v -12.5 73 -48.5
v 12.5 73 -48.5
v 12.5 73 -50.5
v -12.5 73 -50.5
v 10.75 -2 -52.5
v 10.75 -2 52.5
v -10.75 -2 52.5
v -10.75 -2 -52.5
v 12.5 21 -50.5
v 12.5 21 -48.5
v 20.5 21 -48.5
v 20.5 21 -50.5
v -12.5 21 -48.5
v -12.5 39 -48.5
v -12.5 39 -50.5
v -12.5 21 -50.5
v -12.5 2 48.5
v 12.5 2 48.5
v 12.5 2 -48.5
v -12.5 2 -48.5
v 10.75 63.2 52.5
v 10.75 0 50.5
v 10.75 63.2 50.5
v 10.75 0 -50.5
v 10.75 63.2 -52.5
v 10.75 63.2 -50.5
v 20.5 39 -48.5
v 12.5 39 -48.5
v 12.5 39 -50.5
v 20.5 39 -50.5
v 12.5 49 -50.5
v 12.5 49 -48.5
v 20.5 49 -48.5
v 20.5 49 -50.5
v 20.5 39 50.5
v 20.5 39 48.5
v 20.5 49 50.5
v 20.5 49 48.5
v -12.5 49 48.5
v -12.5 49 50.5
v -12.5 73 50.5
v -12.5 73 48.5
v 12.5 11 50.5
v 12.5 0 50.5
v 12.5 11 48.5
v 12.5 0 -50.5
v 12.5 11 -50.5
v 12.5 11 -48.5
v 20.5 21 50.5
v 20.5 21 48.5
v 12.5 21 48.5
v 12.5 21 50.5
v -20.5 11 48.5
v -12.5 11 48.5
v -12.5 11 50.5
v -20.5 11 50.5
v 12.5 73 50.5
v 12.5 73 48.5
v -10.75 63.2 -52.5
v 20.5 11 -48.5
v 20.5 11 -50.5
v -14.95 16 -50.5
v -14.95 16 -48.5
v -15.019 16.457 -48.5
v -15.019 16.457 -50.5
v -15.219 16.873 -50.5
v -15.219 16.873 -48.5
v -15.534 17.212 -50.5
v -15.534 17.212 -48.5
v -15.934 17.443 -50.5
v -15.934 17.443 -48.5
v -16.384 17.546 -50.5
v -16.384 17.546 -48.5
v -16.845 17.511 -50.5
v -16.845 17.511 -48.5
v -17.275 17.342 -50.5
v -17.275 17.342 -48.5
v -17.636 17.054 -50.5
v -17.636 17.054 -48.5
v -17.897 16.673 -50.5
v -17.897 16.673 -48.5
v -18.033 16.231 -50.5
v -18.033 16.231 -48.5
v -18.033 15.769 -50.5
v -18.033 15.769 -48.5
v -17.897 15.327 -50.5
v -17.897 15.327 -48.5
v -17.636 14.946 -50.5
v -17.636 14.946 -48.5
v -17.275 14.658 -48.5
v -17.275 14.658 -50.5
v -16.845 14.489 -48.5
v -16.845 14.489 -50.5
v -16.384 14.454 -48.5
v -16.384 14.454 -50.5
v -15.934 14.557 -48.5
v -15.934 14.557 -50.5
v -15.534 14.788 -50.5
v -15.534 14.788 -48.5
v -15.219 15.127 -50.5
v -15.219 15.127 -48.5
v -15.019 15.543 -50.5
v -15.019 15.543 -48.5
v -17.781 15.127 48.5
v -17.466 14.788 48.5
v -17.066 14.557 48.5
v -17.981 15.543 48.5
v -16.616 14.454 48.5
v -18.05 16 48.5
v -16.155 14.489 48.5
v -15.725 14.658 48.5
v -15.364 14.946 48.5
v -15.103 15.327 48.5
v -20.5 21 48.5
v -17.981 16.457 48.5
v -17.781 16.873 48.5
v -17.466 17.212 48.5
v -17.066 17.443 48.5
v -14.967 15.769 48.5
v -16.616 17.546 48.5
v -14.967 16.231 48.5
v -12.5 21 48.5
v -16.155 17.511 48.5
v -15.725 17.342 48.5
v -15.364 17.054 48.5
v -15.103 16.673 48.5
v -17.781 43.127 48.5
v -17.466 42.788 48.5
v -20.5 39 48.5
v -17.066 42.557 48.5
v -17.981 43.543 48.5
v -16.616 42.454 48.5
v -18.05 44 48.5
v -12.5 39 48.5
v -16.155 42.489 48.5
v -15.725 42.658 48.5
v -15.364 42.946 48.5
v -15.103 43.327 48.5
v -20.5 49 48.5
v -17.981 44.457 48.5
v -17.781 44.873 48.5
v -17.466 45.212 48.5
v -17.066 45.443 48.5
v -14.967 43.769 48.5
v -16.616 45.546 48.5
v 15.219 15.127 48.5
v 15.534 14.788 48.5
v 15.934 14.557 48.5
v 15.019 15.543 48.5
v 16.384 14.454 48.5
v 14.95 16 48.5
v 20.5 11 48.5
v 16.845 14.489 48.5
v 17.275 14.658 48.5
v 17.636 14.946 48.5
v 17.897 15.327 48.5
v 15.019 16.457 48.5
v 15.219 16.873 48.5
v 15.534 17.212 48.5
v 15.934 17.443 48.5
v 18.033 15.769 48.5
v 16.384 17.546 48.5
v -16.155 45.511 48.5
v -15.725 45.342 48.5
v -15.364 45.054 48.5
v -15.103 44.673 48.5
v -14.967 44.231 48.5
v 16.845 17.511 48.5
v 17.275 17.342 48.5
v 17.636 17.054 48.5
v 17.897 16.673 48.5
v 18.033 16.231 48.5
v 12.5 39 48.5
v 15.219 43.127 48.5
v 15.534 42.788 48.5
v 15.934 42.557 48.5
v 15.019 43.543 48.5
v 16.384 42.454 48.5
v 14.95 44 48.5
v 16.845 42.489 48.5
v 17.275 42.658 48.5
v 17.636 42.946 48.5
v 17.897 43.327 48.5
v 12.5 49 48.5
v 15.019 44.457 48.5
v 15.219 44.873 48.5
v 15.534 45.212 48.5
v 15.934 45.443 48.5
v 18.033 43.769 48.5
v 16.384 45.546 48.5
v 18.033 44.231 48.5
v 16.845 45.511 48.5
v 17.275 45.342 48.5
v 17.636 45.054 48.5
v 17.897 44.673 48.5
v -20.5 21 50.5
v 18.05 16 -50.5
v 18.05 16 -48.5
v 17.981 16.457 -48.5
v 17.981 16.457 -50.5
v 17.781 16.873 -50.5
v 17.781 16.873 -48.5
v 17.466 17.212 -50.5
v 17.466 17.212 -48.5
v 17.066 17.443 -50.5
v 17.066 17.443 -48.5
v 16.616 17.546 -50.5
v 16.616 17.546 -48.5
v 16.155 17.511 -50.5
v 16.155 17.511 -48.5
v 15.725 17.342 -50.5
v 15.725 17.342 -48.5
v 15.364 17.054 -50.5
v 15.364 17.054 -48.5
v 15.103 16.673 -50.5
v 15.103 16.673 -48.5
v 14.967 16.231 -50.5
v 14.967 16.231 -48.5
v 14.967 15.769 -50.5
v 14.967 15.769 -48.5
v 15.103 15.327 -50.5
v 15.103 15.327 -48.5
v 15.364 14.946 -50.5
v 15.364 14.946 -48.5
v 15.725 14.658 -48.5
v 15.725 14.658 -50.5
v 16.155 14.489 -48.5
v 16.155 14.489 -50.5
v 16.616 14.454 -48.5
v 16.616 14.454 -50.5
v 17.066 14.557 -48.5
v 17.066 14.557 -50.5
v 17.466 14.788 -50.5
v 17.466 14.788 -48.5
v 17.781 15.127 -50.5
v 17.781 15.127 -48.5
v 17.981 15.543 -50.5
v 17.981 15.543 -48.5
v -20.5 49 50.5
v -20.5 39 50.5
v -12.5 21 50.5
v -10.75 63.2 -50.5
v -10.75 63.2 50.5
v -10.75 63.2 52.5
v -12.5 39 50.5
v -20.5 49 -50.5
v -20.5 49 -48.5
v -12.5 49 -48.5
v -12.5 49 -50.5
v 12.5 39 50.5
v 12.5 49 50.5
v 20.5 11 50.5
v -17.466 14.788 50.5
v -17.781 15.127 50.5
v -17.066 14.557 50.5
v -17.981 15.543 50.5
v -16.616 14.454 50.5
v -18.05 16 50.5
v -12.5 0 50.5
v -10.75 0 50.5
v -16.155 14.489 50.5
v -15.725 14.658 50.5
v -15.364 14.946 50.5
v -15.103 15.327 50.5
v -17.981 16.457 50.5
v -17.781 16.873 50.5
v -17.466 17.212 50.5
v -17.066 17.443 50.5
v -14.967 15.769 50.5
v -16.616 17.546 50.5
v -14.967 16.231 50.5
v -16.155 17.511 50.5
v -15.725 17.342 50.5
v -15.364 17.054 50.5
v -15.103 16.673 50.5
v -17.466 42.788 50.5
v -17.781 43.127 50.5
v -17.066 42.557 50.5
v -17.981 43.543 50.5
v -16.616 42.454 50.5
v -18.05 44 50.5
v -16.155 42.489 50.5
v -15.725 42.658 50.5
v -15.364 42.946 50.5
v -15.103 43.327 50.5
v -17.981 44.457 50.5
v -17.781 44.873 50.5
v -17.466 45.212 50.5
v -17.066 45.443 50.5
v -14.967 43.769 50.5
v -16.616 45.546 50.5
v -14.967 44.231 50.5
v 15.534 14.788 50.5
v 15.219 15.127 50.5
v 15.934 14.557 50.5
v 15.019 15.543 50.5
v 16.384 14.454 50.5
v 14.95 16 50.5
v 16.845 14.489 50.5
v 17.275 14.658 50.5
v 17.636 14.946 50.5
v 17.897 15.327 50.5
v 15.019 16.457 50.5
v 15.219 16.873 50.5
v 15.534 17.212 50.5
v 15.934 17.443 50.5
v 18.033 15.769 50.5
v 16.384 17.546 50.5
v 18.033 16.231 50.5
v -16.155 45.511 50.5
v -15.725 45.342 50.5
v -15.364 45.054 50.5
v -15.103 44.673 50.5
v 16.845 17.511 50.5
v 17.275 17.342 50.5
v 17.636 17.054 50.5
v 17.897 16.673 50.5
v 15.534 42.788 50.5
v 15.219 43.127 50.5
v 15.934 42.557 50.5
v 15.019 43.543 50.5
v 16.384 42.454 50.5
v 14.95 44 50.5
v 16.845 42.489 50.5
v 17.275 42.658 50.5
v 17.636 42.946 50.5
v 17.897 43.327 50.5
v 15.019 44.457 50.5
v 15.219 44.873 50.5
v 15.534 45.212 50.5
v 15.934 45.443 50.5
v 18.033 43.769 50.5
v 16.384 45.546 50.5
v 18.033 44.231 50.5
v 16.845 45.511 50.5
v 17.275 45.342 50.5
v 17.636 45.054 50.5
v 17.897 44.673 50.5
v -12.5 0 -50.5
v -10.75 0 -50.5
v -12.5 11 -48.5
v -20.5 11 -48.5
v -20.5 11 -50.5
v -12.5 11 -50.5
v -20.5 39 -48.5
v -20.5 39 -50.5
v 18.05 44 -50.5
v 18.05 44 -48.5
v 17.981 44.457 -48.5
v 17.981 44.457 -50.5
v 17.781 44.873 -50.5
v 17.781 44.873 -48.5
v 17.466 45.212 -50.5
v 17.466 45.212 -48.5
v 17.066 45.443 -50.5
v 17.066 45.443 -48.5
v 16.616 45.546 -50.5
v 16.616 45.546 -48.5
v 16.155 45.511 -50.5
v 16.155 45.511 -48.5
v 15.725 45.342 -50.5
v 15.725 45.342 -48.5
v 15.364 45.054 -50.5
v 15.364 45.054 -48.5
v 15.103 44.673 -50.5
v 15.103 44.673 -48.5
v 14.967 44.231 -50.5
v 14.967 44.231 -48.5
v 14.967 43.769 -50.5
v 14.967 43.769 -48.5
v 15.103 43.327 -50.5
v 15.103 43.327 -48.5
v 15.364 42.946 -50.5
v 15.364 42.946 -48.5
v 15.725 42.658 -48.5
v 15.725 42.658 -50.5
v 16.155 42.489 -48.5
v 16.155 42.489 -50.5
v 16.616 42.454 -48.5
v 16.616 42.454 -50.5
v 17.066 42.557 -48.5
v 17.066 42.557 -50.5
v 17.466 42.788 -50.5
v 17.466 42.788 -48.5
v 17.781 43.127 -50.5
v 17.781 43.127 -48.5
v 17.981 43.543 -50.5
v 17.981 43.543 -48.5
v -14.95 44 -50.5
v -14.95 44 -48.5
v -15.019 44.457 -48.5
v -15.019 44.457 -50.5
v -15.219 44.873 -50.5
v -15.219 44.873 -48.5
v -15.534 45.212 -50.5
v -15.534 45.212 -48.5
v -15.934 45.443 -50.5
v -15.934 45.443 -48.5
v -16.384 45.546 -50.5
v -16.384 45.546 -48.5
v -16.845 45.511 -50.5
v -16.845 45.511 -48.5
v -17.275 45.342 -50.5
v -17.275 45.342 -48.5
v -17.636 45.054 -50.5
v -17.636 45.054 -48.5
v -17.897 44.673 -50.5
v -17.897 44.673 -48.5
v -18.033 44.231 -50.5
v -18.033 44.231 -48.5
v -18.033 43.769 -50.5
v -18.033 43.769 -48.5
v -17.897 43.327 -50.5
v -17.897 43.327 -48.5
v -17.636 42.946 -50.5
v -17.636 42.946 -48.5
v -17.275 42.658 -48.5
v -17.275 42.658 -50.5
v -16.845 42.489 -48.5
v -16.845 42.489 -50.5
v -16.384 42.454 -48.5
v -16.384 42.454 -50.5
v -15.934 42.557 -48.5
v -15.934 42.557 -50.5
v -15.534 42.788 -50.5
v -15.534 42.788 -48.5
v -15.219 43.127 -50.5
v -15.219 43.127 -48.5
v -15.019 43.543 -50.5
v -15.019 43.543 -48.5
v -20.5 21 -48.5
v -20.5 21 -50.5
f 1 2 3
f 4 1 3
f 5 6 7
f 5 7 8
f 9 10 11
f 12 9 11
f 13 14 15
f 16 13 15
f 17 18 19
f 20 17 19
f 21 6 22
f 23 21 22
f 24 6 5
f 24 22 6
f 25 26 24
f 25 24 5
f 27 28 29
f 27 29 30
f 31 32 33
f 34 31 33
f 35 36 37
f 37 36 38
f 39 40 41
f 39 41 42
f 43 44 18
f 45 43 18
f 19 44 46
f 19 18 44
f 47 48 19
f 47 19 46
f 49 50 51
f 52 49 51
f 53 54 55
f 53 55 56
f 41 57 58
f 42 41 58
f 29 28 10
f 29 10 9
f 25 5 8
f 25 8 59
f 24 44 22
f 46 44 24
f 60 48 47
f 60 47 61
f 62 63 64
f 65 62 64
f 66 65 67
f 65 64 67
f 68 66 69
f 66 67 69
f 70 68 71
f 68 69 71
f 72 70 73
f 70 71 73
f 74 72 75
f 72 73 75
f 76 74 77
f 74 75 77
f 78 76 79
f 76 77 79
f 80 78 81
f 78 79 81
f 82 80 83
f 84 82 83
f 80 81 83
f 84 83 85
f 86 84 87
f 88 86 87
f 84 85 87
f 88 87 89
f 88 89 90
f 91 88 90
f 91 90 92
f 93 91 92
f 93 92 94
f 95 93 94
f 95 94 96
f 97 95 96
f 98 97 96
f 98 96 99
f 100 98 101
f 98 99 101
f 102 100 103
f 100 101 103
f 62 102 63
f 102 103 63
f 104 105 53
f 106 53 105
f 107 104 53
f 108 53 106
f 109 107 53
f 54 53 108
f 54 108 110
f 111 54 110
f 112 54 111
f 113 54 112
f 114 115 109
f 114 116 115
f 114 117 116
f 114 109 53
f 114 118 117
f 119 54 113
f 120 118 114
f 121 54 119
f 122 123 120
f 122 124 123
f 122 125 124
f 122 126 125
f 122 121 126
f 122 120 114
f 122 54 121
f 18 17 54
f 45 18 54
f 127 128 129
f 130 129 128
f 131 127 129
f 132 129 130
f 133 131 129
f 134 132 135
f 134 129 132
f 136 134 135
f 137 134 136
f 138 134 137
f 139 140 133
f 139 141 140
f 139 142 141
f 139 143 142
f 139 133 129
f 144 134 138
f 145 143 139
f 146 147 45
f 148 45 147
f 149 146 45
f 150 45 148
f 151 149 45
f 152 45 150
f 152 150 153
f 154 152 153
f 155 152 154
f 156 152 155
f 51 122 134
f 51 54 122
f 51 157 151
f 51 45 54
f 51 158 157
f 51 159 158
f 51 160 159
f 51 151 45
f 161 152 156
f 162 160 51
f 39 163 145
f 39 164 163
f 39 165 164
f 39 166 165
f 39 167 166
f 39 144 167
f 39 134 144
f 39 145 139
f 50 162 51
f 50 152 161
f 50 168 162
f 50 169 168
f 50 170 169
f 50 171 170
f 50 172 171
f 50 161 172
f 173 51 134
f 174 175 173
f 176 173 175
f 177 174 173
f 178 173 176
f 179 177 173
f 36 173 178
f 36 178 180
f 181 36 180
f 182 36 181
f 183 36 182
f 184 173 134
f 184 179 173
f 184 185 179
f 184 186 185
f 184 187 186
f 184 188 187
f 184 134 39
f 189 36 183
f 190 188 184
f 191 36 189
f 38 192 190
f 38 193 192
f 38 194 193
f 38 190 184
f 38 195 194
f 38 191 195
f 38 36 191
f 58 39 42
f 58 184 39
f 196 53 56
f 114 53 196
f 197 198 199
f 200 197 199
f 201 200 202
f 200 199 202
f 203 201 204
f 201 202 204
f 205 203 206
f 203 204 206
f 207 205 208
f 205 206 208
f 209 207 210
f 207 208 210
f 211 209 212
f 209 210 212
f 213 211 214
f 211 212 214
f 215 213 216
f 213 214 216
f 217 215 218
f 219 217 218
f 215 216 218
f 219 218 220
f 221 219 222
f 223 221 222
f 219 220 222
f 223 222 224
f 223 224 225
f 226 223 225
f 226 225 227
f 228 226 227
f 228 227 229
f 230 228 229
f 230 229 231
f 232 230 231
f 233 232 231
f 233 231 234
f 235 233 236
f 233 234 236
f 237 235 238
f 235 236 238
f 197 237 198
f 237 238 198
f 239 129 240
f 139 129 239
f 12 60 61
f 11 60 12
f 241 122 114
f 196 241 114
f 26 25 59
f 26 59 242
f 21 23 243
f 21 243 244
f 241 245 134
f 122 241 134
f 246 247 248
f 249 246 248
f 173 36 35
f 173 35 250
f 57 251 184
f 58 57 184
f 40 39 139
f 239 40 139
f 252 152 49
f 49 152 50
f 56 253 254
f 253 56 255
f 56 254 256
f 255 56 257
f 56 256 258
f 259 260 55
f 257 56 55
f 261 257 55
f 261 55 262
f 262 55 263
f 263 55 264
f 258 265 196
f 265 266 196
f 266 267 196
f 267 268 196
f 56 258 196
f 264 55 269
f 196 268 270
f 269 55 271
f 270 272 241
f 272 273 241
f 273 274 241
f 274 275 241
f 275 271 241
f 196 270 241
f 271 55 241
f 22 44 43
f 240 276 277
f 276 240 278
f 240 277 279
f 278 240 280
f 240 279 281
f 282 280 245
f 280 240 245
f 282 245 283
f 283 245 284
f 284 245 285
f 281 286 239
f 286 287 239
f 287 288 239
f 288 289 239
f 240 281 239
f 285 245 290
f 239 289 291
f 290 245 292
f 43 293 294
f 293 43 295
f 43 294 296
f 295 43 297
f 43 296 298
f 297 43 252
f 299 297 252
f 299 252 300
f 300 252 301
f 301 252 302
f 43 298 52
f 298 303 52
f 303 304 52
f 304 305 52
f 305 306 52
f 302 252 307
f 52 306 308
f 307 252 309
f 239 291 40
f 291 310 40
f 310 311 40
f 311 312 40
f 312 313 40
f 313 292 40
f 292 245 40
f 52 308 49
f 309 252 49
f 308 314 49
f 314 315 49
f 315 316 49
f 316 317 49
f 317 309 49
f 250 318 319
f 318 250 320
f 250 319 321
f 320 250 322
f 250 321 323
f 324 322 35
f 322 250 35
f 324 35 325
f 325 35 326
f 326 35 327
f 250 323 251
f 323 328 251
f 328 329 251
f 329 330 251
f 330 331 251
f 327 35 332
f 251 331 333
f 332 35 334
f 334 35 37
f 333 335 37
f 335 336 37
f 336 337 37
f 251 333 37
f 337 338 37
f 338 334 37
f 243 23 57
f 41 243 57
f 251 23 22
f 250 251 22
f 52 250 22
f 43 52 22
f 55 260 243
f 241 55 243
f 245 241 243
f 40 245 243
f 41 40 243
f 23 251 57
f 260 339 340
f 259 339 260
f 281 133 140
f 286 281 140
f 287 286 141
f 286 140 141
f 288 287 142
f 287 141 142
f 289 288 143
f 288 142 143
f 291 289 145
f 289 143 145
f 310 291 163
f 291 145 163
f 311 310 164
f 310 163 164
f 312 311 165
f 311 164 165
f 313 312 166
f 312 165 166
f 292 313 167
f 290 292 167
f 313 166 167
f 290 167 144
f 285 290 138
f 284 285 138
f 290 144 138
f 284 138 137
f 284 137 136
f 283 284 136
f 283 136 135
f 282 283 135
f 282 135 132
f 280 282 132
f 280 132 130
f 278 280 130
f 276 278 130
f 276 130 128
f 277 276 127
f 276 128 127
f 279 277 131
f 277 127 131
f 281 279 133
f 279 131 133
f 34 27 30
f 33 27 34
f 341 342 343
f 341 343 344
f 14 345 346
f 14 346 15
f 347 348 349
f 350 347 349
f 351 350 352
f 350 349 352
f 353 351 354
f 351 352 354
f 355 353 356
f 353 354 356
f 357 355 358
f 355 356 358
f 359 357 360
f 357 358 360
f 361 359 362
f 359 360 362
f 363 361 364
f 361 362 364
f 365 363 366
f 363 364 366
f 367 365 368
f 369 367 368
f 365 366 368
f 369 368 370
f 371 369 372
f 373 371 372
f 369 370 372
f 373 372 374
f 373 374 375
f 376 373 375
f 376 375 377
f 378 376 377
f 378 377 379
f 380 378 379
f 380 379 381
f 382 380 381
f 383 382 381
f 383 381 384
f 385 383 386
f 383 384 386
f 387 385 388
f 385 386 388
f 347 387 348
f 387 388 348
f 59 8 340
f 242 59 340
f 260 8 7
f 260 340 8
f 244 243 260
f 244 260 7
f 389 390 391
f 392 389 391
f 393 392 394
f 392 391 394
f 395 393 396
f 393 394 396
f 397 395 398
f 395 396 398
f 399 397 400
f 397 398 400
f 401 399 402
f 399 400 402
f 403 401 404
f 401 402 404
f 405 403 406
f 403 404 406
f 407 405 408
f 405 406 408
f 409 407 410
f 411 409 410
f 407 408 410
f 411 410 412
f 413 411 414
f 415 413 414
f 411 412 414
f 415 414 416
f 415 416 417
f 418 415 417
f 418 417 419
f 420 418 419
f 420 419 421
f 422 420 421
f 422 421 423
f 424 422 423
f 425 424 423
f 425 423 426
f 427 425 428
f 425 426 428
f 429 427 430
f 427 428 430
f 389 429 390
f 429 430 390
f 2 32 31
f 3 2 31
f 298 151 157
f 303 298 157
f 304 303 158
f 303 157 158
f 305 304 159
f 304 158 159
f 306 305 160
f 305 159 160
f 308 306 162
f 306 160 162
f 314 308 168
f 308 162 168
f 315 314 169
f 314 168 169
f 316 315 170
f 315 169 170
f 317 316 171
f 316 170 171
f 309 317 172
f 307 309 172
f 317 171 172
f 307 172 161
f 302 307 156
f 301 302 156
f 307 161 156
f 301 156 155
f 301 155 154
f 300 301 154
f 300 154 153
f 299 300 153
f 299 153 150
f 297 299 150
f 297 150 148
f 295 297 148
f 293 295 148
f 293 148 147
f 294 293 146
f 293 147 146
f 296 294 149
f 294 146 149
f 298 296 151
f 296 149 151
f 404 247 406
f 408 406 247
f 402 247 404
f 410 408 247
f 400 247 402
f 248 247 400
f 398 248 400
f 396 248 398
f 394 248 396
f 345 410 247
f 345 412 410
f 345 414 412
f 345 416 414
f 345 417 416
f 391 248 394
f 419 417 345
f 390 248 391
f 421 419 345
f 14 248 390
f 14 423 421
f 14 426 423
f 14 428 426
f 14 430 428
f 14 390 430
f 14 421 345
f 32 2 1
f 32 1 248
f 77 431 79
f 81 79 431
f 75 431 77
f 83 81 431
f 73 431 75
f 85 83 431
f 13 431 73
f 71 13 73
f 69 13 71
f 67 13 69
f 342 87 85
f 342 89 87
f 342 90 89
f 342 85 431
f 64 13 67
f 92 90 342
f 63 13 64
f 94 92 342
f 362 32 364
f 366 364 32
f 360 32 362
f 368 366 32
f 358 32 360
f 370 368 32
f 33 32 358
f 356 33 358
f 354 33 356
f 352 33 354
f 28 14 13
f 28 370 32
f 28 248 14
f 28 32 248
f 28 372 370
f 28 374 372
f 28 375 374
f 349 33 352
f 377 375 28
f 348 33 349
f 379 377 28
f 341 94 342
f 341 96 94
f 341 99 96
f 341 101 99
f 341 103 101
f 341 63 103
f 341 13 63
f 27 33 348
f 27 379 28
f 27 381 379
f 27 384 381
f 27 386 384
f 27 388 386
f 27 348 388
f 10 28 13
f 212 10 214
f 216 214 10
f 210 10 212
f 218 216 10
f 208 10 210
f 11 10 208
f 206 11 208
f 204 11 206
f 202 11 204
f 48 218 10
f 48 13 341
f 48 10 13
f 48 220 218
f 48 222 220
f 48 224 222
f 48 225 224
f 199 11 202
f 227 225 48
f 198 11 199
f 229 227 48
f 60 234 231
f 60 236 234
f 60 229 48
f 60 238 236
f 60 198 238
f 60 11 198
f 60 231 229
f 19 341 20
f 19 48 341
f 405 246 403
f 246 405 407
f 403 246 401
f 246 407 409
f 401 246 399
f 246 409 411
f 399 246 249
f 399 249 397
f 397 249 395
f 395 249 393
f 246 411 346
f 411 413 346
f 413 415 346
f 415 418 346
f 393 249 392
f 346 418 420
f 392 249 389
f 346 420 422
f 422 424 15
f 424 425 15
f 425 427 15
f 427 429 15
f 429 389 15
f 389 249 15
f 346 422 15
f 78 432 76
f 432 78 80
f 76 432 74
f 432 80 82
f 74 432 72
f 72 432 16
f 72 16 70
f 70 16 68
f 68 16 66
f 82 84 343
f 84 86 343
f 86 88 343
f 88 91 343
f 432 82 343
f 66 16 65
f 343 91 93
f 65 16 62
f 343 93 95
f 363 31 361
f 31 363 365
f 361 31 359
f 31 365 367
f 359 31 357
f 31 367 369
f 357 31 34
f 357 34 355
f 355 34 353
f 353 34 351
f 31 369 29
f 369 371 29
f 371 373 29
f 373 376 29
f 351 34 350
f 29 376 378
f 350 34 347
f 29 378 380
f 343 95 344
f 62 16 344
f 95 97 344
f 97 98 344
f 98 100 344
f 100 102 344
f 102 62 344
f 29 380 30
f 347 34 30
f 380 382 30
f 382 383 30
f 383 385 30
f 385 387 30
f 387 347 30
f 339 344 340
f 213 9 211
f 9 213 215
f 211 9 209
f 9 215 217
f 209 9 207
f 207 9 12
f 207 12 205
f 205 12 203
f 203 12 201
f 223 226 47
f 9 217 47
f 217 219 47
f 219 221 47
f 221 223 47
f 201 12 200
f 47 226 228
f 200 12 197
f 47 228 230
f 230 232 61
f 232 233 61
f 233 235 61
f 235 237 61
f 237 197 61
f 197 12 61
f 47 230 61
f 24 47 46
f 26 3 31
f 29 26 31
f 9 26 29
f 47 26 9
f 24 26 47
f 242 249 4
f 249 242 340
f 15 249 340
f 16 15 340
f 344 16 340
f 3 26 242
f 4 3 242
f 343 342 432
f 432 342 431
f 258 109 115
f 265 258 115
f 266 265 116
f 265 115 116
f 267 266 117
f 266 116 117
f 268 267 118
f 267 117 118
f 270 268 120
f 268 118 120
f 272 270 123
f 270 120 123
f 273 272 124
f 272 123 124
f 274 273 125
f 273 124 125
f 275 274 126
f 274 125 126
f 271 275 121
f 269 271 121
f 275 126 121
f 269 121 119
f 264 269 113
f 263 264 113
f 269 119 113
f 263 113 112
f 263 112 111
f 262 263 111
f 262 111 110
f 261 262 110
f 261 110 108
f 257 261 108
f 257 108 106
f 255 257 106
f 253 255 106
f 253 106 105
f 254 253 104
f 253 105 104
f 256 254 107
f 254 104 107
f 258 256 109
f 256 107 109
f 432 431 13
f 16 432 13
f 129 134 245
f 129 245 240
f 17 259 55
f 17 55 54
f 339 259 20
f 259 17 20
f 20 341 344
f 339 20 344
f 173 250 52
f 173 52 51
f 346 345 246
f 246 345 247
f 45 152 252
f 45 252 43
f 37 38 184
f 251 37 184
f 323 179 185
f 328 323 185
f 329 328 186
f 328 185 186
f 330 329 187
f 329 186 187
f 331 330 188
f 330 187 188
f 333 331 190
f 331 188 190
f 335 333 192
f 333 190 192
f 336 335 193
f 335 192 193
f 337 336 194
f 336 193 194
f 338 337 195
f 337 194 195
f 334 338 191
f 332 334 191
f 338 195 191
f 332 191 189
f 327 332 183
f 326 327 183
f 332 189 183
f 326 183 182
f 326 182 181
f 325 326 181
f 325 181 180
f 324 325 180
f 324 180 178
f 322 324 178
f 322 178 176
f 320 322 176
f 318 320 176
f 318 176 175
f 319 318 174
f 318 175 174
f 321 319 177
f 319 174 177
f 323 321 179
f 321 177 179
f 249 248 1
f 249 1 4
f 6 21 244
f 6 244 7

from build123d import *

# Parameters (mm, degrees)
SKETCH1_W           = 105
SKETCH1_H           = 4
SKETCH1_W_2         = 2
SKETCH1_H_2         = 9.8
BOSS_EXTRUDE1_DEPTH = 12.5
SKETCH2_W           = 8
SKETCH2_H           = 10
SKETCH2_R           = 1.55
BOSS_EXTRUDE2_DEPTH = 2
SKETCH4_W           = 8
SKETCH4_H           = 10
SKETCH4_R           = 1.55
BOSS_EXTRUDE3_DEPTH = 2
SKETCH5_W           = 101
SKETCH5_H           = 2
CUT_EXTRUDE1_DEPTH  = 1.75
SKETCH6_W           = 101
SKETCH6_H           = 2
CUT_EXTRUDE2_DEPTH  = 1.75


with BuildPart() as part:
    # Sketch1 → Boss-Extrude1 (new body, symmetric)
    with BuildSketch(Plane(origin=(0, 0, 0), x_dir=(0, 0, -1), z_dir=(1, 0, 0))):
        Rectangle(SKETCH1_W, SKETCH1_H)
        Polygon((-52.5, 63.2), (-52.5, 2), (-48.5, 2), (-48.5, 63.2), (-50.5, 63.2), align=None)
        Polygon((48.5, 63.2), (48.5, 2), (52.5, 2), (52.5, 63.2), (50.5, 63.2), align=None)
        with Locations((-49.5, 68.1)):
            Rectangle(SKETCH1_W_2, SKETCH1_H_2)
        with Locations((49.5, 68.1)):
            Rectangle(SKETCH1_W_2, SKETCH1_H_2)
    extrude(amount=BOSS_EXTRUDE1_DEPTH, both=True)

    # Sketch2 → Boss-Extrude2 (add)
    with BuildSketch(Plane.XY.offset(-48.5)):
        with Locations((-16.5, 16)):
            Rectangle(SKETCH2_W, SKETCH2_H)
        with Locations((-16.5, 16)):
            Circle(SKETCH2_R, mode=Mode.SUBTRACT)
        with Locations((-16.5, 44)):
            Rectangle(SKETCH2_W, SKETCH2_H)
        with Locations((-16.5, 44)):
            Circle(SKETCH2_R, mode=Mode.SUBTRACT)
        with Locations((16.5, 16)):
            Rectangle(SKETCH2_W, SKETCH2_H)
        with Locations((16.5, 16)):
            Circle(SKETCH2_R, mode=Mode.SUBTRACT)
        with Locations((16.5, 44)):
            Rectangle(SKETCH2_W, SKETCH2_H)
        with Locations((16.5, 44)):
            Circle(SKETCH2_R, mode=Mode.SUBTRACT)
    extrude(amount=-BOSS_EXTRUDE2_DEPTH)

    # Sketch4 → Boss-Extrude3 (add)
    with BuildSketch(Plane(origin=(0, 0, 48.5), x_dir=(-1, 0, 0), z_dir=(0, 0, -1))):
        with Locations((-16.5, 16)):
            Rectangle(SKETCH4_W, SKETCH4_H)
        with Locations((-16.5, 16)):
            Circle(SKETCH4_R, mode=Mode.SUBTRACT)
        with Locations((-16.5, 44)):
            Rectangle(SKETCH4_W, SKETCH4_H)
        with Locations((-16.5, 44)):
            Circle(SKETCH4_R, mode=Mode.SUBTRACT)
        with Locations((16.5, 16)):
            Rectangle(SKETCH4_W, SKETCH4_H)
        with Locations((16.5, 16)):
            Circle(SKETCH4_R, mode=Mode.SUBTRACT)
        with Locations((16.5, 44)):
            Rectangle(SKETCH4_W, SKETCH4_H)
        with Locations((16.5, 44)):
            Circle(SKETCH4_R, mode=Mode.SUBTRACT)
    extrude(amount=-BOSS_EXTRUDE3_DEPTH)

    # Sketch5 → Cut-Extrude1 (cut)
    with BuildSketch(Plane.ZY.offset(12.5)):
        Polygon((-50.5, 63.2), (-52.5, 63.2), (-52.5, -2), (-50.5, -2), (-50.5, 0), (-50.5, 11), (-50.5, 21), (-50.5, 39), (-50.5, 49), align=None)
        with Locations((0, -1)):
            Rectangle(SKETCH5_W, SKETCH5_H)
        Polygon((50.5, 0), (50.5, -2), (52.5, -2), (52.5, 63.2), (50.5, 63.2), (50.5, 49), (50.5, 39), (50.5, 21), (50.5, 11), align=None)
    extrude(amount=-CUT_EXTRUDE1_DEPTH, mode=Mode.SUBTRACT)

    # Sketch6 → Cut-Extrude2 (cut)
    with BuildSketch(Plane(origin=(12.5, 0, 0), x_dir=(0, 0, -1), z_dir=(1, 0, 0))):
        Polygon((-50.5, 0), (-50.5, 63.2), (-52.5, 63.2), (-52.5, -2), (-50.5, -2), align=None)
        with Locations((0, -1)):
            Rectangle(SKETCH6_W, SKETCH6_H)
        Polygon((50.5, 63.2), (50.5, 0), (50.5, -2), (52.5, -2), (52.5, 63.2), align=None)
    extrude(amount=-CUT_EXTRUDE2_DEPTH, mode=Mode.SUBTRACT)


solid = part.part
